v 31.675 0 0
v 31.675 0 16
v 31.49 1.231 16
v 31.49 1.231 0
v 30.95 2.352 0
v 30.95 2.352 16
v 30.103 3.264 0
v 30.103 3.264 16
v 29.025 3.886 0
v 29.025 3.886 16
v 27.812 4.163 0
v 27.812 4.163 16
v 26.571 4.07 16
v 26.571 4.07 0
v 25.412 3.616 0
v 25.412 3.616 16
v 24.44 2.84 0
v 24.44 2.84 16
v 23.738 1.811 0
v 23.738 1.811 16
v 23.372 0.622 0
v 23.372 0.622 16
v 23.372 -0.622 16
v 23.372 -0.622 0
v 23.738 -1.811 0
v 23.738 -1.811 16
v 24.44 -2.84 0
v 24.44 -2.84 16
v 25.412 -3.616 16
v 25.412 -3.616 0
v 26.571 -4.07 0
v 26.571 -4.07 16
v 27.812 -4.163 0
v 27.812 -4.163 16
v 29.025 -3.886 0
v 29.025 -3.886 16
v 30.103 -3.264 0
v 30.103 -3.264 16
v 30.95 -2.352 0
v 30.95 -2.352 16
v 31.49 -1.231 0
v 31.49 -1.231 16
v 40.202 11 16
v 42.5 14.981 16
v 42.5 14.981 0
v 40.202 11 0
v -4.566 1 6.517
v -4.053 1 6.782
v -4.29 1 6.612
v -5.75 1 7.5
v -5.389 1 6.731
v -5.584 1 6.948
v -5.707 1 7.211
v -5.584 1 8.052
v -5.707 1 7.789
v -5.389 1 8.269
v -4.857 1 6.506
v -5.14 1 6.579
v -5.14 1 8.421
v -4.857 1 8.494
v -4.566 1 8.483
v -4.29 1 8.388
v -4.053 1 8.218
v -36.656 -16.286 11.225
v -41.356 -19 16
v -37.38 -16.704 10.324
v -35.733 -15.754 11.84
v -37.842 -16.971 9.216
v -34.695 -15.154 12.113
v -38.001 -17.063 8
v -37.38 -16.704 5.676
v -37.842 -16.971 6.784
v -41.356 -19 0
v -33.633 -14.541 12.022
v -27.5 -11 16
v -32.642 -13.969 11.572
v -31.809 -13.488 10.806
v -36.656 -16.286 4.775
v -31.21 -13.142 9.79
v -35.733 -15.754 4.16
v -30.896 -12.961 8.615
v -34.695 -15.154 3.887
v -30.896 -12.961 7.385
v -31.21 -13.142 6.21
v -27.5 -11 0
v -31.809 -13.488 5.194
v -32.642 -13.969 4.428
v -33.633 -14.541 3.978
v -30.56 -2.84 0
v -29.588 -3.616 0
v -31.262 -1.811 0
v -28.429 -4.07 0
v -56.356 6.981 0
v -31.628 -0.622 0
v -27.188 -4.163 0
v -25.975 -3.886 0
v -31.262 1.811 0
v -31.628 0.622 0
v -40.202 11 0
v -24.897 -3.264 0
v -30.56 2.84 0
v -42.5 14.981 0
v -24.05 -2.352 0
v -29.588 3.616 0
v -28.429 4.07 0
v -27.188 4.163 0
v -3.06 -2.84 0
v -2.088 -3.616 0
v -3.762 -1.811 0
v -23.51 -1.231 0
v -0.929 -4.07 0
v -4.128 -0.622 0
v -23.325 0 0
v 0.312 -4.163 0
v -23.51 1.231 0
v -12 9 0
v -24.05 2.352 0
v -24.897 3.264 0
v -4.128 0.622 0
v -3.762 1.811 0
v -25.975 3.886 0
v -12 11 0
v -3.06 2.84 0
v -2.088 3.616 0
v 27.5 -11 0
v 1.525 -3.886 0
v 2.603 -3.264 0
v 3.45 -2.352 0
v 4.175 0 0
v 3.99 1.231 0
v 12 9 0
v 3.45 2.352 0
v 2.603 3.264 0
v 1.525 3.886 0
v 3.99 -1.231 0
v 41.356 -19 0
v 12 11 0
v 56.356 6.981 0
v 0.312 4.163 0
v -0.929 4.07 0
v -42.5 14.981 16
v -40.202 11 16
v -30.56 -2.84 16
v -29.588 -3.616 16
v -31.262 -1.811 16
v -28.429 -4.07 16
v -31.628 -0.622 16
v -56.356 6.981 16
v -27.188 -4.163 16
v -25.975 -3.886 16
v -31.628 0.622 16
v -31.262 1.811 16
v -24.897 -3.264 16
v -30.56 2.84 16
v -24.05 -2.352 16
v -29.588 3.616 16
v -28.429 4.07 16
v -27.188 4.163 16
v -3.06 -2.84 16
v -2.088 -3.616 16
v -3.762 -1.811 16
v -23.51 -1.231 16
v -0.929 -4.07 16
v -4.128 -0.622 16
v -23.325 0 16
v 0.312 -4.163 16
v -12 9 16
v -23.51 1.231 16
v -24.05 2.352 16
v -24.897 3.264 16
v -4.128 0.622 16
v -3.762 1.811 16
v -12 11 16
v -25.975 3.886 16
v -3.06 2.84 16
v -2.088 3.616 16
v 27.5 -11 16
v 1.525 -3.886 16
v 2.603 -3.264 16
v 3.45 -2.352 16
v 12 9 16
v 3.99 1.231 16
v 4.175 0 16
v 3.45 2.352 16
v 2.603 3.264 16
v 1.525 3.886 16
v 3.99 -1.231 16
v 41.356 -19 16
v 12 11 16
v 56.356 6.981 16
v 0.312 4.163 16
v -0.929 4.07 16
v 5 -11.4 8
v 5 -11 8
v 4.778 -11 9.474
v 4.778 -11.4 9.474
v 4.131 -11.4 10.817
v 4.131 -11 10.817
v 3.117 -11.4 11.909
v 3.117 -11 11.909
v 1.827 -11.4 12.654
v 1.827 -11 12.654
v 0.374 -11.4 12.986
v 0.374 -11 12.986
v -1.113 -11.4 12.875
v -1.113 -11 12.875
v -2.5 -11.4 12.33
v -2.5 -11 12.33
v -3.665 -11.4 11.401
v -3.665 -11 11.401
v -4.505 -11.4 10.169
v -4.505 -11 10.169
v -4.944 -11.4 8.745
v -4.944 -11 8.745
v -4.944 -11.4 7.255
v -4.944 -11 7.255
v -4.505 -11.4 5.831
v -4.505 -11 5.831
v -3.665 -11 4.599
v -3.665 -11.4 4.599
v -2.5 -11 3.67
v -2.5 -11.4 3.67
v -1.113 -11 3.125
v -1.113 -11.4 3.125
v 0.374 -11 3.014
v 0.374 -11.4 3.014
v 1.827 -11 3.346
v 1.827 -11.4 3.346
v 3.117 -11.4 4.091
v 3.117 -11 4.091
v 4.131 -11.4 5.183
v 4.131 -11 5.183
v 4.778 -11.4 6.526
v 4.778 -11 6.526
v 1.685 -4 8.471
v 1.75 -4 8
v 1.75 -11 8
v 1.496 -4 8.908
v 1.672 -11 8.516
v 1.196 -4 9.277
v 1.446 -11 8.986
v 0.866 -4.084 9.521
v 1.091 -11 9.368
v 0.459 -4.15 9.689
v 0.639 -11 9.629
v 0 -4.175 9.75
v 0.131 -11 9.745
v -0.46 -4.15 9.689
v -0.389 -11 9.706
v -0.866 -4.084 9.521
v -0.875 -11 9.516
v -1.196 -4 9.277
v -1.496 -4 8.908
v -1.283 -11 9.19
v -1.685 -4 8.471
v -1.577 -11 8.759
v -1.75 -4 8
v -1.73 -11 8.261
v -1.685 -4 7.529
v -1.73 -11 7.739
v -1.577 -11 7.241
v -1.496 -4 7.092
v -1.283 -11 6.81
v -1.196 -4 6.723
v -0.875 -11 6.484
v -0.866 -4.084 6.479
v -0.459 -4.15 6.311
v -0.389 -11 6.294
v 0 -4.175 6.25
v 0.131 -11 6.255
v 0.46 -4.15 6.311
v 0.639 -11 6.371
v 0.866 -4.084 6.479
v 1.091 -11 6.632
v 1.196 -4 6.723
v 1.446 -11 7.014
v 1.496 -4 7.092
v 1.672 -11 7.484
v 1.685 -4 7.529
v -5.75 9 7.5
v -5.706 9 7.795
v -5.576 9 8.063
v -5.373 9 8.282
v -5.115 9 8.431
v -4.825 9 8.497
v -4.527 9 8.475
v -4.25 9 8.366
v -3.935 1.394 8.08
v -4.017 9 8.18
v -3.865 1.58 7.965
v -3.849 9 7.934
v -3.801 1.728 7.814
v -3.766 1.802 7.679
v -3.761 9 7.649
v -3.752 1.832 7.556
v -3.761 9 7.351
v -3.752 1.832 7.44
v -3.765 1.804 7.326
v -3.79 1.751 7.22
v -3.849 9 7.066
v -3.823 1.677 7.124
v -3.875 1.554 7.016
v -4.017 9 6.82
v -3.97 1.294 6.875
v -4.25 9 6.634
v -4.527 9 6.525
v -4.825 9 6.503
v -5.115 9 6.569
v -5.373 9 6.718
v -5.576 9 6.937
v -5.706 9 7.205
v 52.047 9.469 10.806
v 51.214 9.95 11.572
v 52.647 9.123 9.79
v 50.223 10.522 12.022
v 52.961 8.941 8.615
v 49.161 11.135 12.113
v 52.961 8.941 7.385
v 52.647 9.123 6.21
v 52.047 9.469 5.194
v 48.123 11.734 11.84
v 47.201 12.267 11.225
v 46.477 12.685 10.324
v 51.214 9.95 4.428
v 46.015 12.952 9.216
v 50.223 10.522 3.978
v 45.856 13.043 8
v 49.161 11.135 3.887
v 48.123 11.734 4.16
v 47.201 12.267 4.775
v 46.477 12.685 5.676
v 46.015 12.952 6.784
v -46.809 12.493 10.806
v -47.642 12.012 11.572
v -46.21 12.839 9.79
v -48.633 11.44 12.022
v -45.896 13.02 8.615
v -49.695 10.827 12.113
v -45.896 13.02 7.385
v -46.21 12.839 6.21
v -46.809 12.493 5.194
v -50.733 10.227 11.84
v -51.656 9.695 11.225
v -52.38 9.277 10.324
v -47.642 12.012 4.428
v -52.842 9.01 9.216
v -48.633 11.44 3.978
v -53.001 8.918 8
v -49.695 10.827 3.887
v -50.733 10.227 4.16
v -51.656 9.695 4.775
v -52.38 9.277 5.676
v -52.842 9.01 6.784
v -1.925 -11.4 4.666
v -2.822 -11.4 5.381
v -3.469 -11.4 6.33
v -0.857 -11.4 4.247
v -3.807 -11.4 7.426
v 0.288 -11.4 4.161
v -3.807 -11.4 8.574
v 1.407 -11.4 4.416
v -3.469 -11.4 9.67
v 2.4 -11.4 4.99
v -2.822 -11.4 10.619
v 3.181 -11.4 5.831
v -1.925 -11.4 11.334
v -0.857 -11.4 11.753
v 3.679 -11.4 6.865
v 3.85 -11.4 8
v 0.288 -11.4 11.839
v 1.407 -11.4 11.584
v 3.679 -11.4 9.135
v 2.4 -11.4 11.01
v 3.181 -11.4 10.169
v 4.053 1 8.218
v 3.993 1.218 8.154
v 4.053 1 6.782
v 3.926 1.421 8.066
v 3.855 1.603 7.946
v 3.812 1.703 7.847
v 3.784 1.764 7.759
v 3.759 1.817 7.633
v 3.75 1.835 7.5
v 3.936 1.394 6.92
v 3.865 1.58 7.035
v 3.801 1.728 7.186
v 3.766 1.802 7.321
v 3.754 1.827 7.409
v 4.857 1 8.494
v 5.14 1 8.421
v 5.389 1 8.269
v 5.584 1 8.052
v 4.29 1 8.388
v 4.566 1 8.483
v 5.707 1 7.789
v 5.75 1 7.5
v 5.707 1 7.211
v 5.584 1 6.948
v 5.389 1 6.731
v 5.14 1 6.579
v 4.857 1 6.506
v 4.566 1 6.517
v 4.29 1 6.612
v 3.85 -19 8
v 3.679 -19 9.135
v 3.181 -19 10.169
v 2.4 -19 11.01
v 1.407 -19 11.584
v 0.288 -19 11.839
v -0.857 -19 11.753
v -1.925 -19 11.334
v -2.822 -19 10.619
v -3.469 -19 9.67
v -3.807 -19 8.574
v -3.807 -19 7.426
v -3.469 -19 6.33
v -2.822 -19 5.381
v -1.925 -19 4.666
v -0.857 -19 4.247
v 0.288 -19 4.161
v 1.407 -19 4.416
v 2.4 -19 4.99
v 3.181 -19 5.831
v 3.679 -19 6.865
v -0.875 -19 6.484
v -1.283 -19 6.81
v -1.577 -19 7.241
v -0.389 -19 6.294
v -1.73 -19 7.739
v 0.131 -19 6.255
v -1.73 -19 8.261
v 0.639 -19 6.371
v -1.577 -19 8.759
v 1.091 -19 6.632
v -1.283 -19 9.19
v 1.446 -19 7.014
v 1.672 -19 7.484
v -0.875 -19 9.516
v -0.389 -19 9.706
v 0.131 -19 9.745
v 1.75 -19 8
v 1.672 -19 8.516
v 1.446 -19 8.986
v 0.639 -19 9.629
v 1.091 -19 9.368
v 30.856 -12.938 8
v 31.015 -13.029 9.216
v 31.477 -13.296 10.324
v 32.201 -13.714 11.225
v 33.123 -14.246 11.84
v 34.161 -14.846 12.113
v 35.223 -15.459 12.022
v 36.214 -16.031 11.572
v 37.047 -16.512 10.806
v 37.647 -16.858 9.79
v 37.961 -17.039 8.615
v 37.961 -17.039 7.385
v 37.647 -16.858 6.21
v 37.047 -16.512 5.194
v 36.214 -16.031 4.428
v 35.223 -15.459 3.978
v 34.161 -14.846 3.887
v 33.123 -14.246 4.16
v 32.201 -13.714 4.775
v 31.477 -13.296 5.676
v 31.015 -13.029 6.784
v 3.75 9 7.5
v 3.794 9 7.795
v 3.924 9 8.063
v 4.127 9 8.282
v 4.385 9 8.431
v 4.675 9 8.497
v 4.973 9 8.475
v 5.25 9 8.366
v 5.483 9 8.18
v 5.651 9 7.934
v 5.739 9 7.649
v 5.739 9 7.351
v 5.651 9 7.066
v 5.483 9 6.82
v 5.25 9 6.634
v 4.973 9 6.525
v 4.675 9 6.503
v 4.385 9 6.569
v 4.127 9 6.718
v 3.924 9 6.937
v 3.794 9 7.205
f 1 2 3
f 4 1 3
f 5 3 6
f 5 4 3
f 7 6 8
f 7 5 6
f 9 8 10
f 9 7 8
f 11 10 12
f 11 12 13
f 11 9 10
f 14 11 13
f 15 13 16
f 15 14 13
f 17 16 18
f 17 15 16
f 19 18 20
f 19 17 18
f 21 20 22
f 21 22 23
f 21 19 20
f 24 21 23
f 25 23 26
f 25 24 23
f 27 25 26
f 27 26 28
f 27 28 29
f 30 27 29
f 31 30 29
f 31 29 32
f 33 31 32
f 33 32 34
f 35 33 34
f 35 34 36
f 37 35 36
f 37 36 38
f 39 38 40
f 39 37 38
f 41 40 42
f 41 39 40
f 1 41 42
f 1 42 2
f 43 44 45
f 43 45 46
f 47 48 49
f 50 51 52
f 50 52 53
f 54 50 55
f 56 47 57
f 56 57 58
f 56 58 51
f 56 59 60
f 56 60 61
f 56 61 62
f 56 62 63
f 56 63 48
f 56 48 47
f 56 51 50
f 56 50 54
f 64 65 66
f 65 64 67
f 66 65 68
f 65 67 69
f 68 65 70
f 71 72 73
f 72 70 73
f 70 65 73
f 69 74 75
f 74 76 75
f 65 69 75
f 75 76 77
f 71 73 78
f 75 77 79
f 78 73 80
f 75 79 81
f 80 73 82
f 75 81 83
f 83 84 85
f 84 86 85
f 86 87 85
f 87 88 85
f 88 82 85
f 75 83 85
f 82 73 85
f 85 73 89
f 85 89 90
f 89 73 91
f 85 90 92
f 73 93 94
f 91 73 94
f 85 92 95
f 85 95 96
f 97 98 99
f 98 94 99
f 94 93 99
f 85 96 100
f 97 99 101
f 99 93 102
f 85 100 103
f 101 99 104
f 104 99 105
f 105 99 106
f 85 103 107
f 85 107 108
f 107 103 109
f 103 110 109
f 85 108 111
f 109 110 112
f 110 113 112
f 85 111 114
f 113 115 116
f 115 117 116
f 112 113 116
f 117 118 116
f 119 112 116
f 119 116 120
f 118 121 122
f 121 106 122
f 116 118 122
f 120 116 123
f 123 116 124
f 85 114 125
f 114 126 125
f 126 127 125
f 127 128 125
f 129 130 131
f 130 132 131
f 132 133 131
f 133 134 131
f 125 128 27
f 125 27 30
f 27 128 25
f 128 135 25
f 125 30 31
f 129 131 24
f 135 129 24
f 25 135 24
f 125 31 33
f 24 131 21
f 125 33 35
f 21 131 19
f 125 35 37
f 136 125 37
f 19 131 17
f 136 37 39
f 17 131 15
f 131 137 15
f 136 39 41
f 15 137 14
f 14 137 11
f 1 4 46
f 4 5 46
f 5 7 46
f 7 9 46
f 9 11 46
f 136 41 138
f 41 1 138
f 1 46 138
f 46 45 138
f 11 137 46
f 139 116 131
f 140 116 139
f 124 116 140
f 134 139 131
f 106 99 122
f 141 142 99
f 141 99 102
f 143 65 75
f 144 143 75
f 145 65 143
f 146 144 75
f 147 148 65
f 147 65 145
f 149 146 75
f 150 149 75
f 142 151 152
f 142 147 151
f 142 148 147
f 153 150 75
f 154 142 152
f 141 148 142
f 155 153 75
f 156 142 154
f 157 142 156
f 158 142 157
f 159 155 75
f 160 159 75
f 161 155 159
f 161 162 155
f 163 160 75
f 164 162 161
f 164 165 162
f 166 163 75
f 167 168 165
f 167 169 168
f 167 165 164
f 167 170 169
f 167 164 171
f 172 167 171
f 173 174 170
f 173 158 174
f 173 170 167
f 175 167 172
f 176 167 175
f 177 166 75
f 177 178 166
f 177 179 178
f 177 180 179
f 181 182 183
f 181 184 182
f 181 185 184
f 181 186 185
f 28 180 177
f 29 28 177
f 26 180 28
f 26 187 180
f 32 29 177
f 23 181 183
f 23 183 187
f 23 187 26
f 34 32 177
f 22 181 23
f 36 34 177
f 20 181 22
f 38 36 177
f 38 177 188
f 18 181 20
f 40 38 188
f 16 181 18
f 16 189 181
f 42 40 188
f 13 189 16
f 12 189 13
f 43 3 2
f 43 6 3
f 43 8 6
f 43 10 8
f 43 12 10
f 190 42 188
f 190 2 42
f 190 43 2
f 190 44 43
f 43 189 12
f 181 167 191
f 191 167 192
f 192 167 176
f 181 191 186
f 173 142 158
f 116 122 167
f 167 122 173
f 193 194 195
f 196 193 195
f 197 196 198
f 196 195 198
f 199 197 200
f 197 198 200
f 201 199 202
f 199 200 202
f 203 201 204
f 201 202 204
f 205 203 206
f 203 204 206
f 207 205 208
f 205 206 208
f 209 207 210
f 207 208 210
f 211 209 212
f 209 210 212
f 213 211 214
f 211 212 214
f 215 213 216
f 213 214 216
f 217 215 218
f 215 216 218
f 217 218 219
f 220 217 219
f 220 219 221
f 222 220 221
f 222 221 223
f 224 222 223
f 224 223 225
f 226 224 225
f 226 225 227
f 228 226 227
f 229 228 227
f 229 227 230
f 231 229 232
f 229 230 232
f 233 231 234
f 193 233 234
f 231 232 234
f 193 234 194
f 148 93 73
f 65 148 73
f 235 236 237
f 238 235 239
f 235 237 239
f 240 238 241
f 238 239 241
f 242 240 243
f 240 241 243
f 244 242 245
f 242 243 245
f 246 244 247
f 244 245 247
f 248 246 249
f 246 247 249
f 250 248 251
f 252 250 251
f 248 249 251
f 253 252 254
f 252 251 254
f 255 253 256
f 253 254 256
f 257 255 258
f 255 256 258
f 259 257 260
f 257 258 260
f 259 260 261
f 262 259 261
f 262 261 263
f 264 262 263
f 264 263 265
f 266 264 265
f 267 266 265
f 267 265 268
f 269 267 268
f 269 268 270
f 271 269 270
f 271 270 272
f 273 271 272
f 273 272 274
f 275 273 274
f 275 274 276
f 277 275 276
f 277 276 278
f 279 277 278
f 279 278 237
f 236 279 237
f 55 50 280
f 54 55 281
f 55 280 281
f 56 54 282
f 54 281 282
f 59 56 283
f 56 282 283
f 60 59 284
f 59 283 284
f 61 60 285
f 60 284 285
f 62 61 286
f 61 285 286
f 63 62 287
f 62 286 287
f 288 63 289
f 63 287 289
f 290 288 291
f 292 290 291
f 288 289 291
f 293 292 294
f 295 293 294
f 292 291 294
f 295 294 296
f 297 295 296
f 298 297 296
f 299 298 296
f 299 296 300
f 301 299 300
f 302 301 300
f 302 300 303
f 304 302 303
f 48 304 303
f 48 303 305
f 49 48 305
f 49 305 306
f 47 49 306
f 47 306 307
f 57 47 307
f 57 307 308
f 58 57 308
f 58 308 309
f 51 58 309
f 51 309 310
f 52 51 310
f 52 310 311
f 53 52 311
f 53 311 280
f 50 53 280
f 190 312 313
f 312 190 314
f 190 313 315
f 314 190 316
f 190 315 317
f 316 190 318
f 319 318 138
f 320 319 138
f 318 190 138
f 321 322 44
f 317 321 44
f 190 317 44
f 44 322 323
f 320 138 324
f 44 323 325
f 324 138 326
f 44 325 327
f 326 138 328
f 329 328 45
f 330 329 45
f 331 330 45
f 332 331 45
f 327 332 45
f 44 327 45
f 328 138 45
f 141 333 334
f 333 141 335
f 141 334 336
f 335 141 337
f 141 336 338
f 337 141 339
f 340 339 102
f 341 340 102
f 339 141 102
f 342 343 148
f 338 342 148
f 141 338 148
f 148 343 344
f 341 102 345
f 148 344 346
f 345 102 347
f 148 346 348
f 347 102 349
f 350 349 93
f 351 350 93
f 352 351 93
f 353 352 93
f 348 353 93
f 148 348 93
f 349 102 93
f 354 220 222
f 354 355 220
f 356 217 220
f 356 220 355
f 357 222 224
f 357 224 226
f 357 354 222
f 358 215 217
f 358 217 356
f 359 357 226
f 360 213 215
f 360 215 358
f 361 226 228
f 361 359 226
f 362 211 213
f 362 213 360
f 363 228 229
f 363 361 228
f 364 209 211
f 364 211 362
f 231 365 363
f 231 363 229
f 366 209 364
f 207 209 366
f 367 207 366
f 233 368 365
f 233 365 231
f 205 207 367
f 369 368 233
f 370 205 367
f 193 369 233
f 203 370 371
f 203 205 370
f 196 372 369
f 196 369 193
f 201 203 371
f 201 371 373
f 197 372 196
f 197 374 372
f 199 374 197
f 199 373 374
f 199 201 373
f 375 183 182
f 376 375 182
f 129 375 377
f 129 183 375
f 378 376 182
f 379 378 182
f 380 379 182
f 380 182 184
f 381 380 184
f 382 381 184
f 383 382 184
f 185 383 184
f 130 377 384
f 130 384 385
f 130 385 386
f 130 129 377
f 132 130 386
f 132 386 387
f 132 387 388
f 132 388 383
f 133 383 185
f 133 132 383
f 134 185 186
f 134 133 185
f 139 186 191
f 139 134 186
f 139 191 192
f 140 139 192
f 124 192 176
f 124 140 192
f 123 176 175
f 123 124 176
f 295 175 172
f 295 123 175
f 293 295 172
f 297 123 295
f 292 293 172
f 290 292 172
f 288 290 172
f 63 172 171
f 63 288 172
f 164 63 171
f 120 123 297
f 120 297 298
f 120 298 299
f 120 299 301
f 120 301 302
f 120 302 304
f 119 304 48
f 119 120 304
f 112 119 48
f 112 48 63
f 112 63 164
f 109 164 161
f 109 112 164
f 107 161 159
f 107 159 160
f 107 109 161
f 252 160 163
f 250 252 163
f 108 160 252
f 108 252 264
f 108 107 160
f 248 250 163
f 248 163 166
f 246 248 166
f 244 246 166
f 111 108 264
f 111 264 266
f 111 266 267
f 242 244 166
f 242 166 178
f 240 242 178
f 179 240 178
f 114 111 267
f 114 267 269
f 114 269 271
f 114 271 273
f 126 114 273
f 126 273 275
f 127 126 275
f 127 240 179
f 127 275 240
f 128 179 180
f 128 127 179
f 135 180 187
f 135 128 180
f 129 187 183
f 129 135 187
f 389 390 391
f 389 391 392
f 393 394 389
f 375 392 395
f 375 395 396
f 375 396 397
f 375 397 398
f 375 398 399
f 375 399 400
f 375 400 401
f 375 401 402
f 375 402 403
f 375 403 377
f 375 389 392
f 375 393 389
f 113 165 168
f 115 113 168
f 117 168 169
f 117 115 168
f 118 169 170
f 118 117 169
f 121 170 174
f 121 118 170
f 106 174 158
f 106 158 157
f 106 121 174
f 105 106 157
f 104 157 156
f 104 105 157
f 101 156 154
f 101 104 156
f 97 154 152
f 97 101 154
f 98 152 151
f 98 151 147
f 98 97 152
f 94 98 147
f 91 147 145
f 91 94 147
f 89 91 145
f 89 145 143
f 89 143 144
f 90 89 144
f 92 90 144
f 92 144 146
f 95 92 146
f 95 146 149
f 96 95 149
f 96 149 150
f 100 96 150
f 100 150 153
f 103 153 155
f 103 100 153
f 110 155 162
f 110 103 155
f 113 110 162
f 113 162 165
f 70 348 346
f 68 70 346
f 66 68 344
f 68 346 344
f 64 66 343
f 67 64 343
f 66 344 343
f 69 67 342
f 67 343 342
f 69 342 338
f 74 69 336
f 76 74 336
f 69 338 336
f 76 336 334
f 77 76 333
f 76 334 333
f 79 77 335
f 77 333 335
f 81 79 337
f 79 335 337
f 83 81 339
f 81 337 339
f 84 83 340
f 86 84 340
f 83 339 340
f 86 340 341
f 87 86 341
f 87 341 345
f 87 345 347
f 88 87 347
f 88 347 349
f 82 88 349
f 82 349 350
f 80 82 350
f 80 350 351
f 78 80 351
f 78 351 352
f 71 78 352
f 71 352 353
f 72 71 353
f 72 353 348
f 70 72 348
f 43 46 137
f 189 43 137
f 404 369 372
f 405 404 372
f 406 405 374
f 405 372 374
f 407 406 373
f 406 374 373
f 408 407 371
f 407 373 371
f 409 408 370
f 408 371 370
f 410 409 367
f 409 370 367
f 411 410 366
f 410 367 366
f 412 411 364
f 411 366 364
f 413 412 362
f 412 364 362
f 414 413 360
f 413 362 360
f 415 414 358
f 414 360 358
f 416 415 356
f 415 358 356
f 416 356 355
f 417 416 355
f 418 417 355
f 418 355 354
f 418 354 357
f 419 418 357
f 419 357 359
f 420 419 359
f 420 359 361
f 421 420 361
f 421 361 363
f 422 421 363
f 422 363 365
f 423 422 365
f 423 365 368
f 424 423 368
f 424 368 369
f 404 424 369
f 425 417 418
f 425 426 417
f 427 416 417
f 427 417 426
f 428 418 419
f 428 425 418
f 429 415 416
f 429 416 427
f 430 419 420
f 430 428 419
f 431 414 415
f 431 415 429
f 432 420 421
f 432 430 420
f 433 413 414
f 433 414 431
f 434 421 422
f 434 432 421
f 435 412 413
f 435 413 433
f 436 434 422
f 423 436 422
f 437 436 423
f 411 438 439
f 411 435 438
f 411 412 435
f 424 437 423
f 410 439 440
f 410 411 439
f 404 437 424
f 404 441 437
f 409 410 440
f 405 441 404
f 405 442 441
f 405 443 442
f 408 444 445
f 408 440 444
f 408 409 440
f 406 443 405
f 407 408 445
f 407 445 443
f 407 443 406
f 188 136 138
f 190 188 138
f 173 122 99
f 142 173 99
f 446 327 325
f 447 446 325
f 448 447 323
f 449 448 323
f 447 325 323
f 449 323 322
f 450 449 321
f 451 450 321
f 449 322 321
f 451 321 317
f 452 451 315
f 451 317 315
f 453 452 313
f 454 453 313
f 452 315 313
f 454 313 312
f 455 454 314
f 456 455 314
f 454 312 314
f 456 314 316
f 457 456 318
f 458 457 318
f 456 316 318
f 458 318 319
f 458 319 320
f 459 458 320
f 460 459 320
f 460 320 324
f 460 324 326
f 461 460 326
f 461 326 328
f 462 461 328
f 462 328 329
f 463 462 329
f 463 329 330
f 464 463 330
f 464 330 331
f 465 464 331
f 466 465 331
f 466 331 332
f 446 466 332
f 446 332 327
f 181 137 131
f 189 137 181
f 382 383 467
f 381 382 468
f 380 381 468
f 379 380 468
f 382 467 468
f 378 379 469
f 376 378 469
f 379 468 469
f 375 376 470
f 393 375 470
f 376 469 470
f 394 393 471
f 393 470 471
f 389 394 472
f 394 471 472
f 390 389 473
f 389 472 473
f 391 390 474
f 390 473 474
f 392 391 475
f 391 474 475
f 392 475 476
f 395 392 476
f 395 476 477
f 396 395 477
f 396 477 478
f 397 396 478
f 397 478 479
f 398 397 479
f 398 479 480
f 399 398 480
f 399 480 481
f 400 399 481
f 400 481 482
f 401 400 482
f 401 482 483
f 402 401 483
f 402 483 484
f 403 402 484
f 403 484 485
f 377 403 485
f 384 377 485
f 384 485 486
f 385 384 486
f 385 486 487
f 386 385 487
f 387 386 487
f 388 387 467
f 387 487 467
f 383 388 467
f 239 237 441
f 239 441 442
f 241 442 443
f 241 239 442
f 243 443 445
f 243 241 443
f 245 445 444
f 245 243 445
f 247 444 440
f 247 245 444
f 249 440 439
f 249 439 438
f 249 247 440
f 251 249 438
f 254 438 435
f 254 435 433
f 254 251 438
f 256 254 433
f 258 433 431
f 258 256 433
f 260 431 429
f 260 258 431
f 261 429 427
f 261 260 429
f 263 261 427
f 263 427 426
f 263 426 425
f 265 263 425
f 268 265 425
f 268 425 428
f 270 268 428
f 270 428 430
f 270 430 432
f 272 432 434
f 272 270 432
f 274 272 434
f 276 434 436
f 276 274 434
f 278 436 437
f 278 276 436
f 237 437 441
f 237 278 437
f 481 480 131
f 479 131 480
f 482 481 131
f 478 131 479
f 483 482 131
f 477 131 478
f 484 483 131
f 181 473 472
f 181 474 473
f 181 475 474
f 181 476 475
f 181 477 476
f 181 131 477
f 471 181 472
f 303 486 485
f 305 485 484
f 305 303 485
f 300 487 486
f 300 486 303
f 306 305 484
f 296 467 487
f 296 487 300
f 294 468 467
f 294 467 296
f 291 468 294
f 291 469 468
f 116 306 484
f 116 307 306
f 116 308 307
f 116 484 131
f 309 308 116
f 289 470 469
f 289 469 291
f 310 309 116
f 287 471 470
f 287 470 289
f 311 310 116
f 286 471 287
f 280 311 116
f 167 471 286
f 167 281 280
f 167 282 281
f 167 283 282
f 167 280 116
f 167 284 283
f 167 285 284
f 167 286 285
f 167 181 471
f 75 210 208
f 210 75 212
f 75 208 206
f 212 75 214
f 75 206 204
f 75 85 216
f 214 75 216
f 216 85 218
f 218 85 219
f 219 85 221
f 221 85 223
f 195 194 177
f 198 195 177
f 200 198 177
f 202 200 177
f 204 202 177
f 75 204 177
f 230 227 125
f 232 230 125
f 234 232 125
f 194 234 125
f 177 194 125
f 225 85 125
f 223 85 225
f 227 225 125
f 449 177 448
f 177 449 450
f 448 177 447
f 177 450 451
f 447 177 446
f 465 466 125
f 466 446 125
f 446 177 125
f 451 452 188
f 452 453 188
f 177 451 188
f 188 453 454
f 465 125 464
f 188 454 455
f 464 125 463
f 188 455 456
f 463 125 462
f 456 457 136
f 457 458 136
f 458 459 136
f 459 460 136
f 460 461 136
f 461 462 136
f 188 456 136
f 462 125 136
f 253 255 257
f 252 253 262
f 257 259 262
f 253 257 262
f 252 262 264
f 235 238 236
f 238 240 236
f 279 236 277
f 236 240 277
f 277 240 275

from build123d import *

# Parameters (mm, degrees)
F0_R      = 4.175
F1_DEPTH  = 16
F2_R      = 4.125
F3_DEPTH  = 40
F4_R      = 4.125
F5_DEPTH  = 40
F6_R      = 3.85
F6_R_2    = 1.75
F7_DEPTH  = 8
F8_DEPTH  = 7
F6_R_3    = 5
F9_DEPTH  = 0.4
F10_R     = 1
F11_DEPTH = 10
F12_W     = 24
F12_H     = 16
F12_R     = 1
F13_DEPTH = 2


with BuildPart() as f1:
    # F0 (on Top) → F1 (new body)
    with BuildSketch(Plane.XY):
        Polygon((-42.5, 14.9807621135), (-56.3564064606, 6.9807621135), (-41.3564064606, -19), (-27.5, -11), (27.5, -11), (41.3564064606, -19), (56.3564064606, 6.9807621135), (42.5, 14.9807621135), (40.2017059222, 11), (0, 11), (-40.2017059222, 11), align=None)
        with Locations((-27.5, 0)):
            Circle(F0_R, mode=Mode.SUBTRACT)
        Circle(F0_R, mode=Mode.SUBTRACT)
        with Locations((27.5, 0)):
            Circle(F0_R, mode=Mode.SUBTRACT)
    extrude(amount=F1_DEPTH)

    # F2 (on face) → F3 (cut)
    with BuildSketch(Plane(origin=(17.1118602792, 29.6386114156, 0), x_dir=(-0.8660254038, 0.5, 0), z_dir=(0.5, 0.8660254038, 0))):
        with Locations((-37.3156986041, 8)):
            Circle(F2_R)
    extrude(amount=-F3_DEPTH, mode=Mode.SUBTRACT)

    # F4 (on face) → F5 (cut)
    with BuildSketch(Plane(origin=(-17.1118602792, 29.6386114156, 0), x_dir=(-0.8660254038, -0.5, 0), z_dir=(-0.5, 0.8660254038, 0))):
        with Locations((37.3156986041, 8)):
            Circle(F4_R)
    extrude(amount=-F5_DEPTH, mode=Mode.SUBTRACT)

    # F6 (on face) → F7 (join)
    with BuildSketch(Plane.XZ.offset(11)):
        with Locations((0, 8)):
            Circle(F6_R)
        with Locations((0, 8)):
            Circle(F6_R_2, mode=Mode.SUBTRACT)
    extrude(amount=F7_DEPTH)

    # F8 (cut): a face of the model
    f8_faces = [f1.faces().sort_by_distance(p)[0] for p in [
        (0, -11, 8),
    ]]
    extrude(f8_faces, amount=-F8_DEPTH, mode=Mode.SUBTRACT)

    # F6 (on face) → F9 (join)
    with BuildSketch(Plane.XZ.offset(11)):
        with Locations((0, 8)):
            Circle(F6_R_3)
        with Locations((0, 8)):
            Circle(F6_R, mode=Mode.SUBTRACT)
    extrude(amount=F9_DEPTH)

    # F10 (on face) → F11 (cut)
    with BuildSketch(Plane(origin=(0, 11, 0), x_dir=(-1, 0, 0), z_dir=(0, 1, 0))):
        with Locations((-4.75, 7.5)):
            Circle(F10_R)
        with Locations((4.75, 7.5)):
            Circle(F10_R)
    extrude(amount=-F11_DEPTH, mode=Mode.SUBTRACT)

    # F12 (on face) → F13 (cut)
    with BuildSketch(Plane(origin=(0, 11, 0), x_dir=(-1, 0, 0), z_dir=(0, 1, 0))):
        with Locations((0, 8)):
            Rectangle(F12_W, F12_H)
        with Locations((-4.75, 7.5)):
            Circle(F12_R, mode=Mode.SUBTRACT)
        with Locations((4.75, 7.5)):
            Circle(F12_R, mode=Mode.SUBTRACT)
    extrude(amount=-F13_DEPTH, mode=Mode.SUBTRACT)


solid = f1.part
